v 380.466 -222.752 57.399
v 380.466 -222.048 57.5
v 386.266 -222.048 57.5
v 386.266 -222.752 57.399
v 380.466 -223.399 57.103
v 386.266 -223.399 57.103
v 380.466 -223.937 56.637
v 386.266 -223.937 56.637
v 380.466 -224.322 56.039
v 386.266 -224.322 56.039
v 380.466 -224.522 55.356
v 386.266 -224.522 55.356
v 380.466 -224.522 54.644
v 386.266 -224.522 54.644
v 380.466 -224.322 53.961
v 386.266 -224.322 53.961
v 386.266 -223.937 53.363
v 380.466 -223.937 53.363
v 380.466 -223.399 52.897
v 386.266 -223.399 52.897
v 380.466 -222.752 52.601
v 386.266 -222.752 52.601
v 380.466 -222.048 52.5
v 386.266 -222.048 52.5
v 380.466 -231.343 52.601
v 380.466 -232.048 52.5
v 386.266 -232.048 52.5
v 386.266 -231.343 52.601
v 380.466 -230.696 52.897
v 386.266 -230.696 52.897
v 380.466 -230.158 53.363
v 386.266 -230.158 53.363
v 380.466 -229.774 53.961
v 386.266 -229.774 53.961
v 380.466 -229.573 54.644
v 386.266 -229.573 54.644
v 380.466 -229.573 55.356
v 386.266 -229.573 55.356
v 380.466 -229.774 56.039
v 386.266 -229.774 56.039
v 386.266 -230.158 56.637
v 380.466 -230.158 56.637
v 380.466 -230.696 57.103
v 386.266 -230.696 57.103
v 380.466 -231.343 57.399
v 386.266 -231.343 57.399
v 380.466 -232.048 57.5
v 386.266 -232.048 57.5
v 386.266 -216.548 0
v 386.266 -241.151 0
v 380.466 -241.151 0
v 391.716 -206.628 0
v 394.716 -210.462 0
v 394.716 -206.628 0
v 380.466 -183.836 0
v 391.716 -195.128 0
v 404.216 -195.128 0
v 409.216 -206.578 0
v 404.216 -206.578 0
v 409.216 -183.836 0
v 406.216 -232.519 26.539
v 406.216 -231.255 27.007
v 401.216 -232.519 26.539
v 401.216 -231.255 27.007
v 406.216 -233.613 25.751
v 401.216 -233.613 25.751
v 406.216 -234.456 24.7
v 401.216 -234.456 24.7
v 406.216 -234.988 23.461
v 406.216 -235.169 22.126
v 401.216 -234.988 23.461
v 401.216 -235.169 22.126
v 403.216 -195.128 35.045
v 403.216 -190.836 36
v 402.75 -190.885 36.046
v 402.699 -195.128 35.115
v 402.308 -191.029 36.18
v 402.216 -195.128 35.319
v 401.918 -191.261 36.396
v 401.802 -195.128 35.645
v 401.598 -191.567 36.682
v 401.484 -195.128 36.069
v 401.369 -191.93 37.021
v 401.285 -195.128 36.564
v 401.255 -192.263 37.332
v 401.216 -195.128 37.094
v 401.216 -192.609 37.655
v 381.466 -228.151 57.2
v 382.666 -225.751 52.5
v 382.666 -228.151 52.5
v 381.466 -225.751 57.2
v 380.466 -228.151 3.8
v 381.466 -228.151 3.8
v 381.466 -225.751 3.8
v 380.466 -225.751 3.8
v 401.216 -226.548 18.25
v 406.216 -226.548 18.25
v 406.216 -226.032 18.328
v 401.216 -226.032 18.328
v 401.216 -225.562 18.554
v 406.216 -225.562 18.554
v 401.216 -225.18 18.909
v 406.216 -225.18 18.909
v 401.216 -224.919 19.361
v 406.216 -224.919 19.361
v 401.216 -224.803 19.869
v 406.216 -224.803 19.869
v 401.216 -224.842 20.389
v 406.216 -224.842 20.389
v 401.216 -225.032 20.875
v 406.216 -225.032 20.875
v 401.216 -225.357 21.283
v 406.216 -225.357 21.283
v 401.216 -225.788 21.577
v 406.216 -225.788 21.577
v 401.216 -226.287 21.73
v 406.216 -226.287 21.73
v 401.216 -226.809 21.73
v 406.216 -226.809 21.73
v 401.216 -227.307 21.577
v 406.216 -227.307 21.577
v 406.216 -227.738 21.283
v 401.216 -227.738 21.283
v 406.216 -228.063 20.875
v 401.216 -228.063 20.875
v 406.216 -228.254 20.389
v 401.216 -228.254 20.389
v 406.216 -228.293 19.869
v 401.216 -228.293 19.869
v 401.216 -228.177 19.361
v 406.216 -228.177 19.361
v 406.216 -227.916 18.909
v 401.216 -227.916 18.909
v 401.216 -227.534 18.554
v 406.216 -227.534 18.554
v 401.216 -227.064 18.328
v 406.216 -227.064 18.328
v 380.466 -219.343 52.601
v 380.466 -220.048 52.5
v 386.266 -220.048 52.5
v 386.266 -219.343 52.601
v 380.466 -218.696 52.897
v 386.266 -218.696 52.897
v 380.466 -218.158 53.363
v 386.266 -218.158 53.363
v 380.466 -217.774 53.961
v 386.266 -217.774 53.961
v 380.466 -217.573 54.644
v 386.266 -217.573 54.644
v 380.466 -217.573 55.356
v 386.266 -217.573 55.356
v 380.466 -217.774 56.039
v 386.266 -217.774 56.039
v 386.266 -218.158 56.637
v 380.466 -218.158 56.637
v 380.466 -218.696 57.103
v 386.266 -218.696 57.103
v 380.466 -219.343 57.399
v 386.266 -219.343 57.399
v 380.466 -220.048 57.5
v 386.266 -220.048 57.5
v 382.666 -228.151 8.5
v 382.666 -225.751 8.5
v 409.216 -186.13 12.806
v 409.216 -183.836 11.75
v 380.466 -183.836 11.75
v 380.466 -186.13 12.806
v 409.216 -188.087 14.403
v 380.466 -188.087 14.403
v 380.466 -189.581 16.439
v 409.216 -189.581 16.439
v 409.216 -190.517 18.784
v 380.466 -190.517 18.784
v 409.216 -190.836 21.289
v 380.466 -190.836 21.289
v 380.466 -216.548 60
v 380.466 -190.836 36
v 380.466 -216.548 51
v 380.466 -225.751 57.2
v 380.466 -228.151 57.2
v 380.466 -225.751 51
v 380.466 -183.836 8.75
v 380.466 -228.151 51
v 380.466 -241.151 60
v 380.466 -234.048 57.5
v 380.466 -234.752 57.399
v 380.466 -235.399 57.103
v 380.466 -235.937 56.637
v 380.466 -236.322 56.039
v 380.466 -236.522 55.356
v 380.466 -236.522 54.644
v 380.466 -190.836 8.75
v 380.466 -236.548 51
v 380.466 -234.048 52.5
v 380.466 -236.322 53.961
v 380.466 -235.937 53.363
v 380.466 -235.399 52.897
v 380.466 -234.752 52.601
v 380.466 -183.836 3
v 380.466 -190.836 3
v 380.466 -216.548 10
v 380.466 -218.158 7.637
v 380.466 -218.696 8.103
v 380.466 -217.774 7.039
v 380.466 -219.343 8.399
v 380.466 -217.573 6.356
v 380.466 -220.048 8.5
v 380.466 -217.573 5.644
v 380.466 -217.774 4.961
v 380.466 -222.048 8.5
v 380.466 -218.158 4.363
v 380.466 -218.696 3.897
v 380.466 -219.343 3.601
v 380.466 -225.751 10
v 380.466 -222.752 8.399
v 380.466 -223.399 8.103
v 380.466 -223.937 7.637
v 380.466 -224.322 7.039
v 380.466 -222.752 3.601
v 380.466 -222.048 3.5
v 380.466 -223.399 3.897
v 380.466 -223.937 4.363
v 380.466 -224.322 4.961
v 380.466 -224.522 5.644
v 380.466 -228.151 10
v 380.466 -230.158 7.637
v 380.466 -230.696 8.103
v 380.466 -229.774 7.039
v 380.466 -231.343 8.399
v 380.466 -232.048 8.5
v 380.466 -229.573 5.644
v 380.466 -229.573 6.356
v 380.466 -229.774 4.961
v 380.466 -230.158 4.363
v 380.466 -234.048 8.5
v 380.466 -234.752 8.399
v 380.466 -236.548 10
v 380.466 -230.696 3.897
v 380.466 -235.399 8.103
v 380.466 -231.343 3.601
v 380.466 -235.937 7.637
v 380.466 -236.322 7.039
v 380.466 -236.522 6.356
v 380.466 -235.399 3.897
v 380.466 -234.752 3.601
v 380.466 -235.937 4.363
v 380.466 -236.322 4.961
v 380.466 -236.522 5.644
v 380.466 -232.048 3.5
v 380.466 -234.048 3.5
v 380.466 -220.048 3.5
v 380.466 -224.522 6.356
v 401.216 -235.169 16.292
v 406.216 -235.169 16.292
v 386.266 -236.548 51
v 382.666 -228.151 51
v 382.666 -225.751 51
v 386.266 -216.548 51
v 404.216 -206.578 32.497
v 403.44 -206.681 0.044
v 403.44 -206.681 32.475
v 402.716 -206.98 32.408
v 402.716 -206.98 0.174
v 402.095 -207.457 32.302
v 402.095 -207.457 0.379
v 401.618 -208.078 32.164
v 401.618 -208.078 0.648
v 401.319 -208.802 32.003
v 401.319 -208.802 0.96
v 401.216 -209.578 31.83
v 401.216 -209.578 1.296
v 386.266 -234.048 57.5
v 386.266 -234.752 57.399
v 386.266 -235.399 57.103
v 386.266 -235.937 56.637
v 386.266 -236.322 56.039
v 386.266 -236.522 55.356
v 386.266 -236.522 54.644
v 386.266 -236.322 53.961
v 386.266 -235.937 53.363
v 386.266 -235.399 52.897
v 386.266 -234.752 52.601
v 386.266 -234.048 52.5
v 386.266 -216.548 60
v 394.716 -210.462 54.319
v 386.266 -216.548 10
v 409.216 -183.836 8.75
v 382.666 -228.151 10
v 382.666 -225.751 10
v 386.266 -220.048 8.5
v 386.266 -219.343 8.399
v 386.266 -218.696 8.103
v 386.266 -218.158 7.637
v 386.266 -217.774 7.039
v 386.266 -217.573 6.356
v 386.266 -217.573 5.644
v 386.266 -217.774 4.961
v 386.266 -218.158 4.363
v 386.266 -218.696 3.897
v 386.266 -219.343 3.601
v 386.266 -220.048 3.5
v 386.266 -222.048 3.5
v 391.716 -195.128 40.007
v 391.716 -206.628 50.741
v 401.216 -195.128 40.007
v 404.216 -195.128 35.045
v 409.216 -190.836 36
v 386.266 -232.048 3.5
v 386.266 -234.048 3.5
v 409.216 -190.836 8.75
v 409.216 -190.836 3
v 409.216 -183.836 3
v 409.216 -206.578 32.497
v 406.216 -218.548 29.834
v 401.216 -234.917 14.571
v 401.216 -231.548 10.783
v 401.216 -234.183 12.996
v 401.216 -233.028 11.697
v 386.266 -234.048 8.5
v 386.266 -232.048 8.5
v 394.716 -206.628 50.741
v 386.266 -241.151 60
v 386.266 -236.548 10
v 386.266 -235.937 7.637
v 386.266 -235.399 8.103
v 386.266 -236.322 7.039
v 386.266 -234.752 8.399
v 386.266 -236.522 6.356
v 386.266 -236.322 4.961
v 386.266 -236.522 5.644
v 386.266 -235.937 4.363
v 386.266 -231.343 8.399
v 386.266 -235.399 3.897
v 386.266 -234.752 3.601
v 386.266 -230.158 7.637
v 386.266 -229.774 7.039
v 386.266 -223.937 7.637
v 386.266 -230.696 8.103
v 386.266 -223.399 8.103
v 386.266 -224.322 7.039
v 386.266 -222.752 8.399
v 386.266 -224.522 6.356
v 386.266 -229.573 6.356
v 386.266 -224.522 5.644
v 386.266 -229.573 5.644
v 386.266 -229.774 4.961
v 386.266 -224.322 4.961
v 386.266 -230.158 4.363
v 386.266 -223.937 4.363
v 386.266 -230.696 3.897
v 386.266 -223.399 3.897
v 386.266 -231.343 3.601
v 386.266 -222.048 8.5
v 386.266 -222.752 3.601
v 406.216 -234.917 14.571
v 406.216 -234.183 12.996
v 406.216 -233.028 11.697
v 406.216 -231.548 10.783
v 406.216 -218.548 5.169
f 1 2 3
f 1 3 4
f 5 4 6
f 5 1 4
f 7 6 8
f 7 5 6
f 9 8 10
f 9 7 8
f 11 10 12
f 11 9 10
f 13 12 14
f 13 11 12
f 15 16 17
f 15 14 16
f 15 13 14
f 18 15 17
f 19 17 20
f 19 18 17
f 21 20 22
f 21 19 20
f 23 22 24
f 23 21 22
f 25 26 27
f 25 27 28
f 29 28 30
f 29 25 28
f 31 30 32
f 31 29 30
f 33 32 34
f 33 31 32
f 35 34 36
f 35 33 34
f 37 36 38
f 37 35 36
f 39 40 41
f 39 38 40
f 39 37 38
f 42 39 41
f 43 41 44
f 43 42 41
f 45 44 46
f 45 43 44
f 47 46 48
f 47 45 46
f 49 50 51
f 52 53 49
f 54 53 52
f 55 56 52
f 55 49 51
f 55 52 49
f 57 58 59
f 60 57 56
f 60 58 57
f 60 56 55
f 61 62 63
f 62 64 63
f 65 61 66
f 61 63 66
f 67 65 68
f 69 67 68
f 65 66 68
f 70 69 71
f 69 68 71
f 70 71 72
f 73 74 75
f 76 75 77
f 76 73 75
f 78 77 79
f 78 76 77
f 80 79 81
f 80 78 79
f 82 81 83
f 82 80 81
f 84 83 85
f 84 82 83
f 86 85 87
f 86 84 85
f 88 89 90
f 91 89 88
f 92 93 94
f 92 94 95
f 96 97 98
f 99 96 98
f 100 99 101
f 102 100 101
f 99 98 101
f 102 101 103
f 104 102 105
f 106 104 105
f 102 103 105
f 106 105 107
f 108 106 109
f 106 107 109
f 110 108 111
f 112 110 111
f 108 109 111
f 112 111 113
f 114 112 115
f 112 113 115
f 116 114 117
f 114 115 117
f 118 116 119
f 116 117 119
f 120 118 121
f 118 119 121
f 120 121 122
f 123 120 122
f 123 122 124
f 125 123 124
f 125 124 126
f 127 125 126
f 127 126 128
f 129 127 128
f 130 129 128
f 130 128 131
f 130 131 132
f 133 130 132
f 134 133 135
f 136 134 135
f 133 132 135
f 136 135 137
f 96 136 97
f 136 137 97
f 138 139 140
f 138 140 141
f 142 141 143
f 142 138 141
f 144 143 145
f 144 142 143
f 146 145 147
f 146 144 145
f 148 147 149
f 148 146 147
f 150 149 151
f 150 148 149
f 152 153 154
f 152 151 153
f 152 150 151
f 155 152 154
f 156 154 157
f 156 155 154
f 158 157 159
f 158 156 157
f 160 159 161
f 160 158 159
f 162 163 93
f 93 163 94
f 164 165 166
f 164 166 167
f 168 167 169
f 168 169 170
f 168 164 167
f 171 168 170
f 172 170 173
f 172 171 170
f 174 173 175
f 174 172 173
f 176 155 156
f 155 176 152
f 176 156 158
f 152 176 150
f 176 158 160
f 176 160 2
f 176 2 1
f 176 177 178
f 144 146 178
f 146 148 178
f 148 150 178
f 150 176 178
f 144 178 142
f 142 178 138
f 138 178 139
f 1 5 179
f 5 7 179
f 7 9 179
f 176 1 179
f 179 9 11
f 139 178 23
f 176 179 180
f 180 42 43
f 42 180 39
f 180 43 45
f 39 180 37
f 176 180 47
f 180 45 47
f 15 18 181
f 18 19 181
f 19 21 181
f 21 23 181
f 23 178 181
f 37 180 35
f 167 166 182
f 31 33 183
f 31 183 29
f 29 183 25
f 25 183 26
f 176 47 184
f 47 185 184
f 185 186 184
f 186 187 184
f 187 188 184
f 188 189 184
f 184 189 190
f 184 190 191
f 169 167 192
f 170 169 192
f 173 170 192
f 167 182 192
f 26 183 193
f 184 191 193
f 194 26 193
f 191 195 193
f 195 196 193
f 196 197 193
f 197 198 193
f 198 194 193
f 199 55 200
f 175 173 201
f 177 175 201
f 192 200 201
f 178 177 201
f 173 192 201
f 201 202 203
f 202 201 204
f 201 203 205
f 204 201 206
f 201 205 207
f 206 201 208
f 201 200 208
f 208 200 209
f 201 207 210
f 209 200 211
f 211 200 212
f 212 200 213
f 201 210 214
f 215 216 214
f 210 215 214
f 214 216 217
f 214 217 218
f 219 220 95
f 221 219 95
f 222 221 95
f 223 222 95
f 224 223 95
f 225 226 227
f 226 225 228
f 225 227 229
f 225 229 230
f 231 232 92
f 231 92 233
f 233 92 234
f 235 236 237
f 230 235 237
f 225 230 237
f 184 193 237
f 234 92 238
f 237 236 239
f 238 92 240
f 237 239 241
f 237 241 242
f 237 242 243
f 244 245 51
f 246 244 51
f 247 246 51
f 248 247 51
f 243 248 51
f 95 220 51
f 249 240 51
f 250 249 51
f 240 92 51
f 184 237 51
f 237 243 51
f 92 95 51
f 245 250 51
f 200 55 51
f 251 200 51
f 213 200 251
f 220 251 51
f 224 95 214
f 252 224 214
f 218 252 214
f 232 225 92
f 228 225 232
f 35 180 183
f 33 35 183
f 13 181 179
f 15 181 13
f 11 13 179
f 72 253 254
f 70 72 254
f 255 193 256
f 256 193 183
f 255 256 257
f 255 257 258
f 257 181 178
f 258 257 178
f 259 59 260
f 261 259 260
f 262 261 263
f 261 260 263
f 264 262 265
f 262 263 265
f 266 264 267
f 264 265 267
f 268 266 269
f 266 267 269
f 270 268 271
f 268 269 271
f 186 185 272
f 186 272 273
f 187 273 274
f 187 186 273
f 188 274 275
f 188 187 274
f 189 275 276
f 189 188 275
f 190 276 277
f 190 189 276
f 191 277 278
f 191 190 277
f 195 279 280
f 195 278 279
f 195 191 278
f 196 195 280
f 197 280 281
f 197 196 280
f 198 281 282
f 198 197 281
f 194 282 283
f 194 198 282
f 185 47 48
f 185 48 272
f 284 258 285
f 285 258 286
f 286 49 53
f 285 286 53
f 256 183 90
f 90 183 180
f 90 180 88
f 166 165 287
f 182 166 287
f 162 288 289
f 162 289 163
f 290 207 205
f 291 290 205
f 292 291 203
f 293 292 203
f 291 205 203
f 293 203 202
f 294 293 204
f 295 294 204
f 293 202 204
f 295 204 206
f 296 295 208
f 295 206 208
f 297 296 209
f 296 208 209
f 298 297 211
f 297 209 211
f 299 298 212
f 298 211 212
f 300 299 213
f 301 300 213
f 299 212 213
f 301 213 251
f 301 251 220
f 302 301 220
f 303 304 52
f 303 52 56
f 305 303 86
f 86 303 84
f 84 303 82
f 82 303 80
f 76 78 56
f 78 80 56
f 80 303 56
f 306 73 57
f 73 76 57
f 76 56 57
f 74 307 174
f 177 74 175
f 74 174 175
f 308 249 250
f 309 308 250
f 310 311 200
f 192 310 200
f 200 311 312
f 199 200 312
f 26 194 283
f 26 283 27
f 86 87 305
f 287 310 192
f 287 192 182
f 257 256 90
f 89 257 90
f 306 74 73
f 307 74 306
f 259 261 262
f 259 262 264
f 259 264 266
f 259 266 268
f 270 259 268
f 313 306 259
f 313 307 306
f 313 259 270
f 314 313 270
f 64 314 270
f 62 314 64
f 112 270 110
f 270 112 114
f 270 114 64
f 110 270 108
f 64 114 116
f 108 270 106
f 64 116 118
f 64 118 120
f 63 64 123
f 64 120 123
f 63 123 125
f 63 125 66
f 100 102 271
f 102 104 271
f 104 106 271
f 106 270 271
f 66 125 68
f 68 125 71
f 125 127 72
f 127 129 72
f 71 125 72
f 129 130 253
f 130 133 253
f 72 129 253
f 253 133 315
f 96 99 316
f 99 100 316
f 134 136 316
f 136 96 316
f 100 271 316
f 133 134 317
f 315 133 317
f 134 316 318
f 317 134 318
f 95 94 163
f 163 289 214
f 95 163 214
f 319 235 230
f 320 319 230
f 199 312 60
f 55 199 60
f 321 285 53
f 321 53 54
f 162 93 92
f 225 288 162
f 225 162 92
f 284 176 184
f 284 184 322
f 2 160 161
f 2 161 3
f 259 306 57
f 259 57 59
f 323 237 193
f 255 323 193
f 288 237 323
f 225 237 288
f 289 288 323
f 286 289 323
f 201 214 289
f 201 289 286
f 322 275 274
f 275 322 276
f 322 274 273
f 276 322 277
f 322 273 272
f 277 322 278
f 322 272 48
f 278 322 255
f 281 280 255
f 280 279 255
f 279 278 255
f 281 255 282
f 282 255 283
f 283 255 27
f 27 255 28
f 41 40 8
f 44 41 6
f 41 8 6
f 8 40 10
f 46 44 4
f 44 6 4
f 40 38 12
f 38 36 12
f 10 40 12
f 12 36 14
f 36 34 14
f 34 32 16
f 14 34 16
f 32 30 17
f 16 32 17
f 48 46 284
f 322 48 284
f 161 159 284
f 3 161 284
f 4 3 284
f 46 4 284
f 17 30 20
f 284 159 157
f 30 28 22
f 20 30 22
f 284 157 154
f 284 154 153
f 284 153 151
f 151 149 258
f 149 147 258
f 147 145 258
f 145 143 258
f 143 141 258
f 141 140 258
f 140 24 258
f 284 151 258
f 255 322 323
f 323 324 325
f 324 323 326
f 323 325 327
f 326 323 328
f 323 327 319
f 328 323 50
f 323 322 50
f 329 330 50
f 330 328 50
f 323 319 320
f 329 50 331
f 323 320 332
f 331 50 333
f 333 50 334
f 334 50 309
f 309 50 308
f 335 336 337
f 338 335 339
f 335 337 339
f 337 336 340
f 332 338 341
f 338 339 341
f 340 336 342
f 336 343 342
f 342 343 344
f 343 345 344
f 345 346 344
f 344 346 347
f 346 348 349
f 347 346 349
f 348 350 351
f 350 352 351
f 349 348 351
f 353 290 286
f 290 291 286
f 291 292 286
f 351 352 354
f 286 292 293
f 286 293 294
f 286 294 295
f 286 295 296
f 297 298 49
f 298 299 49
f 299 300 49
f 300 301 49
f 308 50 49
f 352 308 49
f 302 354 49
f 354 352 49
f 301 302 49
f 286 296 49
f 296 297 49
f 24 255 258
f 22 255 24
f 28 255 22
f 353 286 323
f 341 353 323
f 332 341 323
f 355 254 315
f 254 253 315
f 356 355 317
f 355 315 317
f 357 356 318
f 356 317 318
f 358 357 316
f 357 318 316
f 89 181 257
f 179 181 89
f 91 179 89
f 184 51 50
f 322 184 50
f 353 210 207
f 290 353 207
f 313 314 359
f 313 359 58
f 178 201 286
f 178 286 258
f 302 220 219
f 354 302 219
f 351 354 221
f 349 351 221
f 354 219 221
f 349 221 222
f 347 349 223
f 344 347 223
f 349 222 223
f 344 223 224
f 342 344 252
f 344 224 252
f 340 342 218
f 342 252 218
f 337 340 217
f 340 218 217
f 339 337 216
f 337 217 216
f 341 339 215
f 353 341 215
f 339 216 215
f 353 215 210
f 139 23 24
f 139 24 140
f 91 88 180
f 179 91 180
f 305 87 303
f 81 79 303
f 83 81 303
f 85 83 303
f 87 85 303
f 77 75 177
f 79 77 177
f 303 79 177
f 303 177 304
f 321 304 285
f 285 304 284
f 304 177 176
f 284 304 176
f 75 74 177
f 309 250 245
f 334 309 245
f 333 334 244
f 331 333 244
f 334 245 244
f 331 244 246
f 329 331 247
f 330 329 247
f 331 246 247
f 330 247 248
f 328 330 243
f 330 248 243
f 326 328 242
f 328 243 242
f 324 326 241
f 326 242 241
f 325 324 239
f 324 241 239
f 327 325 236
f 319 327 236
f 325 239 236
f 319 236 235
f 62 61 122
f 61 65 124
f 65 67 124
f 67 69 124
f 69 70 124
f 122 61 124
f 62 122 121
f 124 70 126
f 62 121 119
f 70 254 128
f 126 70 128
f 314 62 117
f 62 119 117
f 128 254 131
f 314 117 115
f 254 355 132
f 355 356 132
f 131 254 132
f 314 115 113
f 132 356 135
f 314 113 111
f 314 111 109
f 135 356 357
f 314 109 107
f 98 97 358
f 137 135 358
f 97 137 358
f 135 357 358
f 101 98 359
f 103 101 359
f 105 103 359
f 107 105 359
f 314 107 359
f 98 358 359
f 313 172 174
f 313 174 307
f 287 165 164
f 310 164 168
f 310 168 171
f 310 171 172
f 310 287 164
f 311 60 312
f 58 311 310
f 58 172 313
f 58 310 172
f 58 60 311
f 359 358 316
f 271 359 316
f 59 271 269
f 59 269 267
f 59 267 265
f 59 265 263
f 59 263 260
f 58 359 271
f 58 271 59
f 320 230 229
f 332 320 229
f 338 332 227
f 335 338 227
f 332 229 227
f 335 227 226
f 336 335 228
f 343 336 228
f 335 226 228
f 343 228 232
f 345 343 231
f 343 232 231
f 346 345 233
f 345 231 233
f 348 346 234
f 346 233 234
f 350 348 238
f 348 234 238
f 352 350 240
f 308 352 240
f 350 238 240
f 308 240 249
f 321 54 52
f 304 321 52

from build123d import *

# Parameters (mm, degrees)
BOSS_EXTRUDE1_DEPTH     = 60
CUT_EXTRUDE1_REACH      = 252.16
SKETCH4_W               = 41
SKETCH4_H               = 20
CUT_EXTRUDE2_DEPTH      = 1
CUT_EXTRUDE2_DEPTH_BACK = 1.4
CUT_EXTRUDE2_START      = -14
SKETCH2_R               = 1.75
CUT_EXTRUDE3_DEPTH      = 5
SKETCH6_W               = 3
SKETCH6_H               = 7
BOSS_EXTRUDE2_DEPTH     = 28.75
FILLET1_R               = 10
CUT_EXTRUDE4_REACH      = 252.16
CUT_EXTRUDE5_REACH      = 252.16
CUT_EXTRUDE6_REACH      = 252.16
FILLET2_R               = 5
FILLET3_R               = 6
FILLET4_R               = 2


with BuildPart() as part:
    # Sketch1 → Boss-Extrude1 (new body)
    with BuildSketch(Plane.XY):
        with BuildLine():
            Line((391.716436469, -195.128416651), (404.216436469, -195.128416651))
            Line((404.216436469, -195.128416651), (404.216436469, -206.578416651))
            ThreePointArc((404.216436469, -206.578416651), (402.095116126, -207.457096307), (401.216436469, -209.578416651))
            Line((401.216436469, -209.578416651), (401.216436469, -235.169373092))
            Line((401.216436469, -235.169373092), (406.216436469, -235.169373092))
            Line((406.216436469, -235.169373092), (406.216436469, -218.547748038))
            Line((406.216436469, -218.547748038), (409.216436469, -206.578416651))
            Line((409.216436469, -206.578416651), (409.216436469, -190.835999092))
            Line((409.216436469, -190.835999092), (380.466436469, -190.835999092))
            Line((380.466436469, -190.835999092), (380.466436469, -241.150690411))
            Line((380.466436469, -241.150690411), (386.266436469, -241.150690411))
            Line((386.266436469, -241.150690411), (386.266436469, -216.54774804))
            Line((386.266436469, -216.54774804), (394.716436469, -210.46208716))
            Line((394.716436469, -210.46208716), (394.716436469, -206.628416651))
            Line((394.716436469, -206.628416651), (391.716436469, -206.628416651))
            Line((391.716436469, -206.628416651), (391.716436469, -195.128416651))
        make_face()
    extrude(amount=BOSS_EXTRUDE1_DEPTH)

    # Cut-Extrude1: up to this face of the body (flat: up to its plane)
    cut_extrude1_end = Plane(part.part.faces().sort_by_distance((386.266436469, -228.849219226, 30))[0])
    # Sketch4 → Cut-Extrude1 (cut, up to the picked face)
    with BuildSketch(Plane.ZY.offset(-380.466436469), mode=Mode.PRIVATE) as cut_extrude1_sk1:
        with BuildLine():
            Line((57.5, -232.04774804), (57.5, -234.04774804))
            ThreePointArc((57.5, -234.04774804), (55, -236.54774804), (52.5, -234.04774804))
            Line((52.5, -234.04774804), (52.5, -232.04774804))
            ThreePointArc((52.5, -232.04774804), (55, -229.54774804), (57.5, -232.04774804))
        make_face()
    cut_extrude1_tool1 = split(extrude(cut_extrude1_sk1.sketch, amount=-CUT_EXTRUDE1_REACH, mode=Mode.PRIVATE), bisect_by=cut_extrude1_end, keep=Keep.BOTH, mode=Mode.PRIVATE)
    # Sketch4 → Cut-Extrude1 (cut, up to the picked face)
    with BuildSketch(Plane.ZY.offset(-380.466436469), mode=Mode.PRIVATE) as cut_extrude1_sk2:
        with Locations((30.5, -226.54774804)):
            Rectangle(SKETCH4_W, SKETCH4_H)
    cut_extrude1_tool2 = split(extrude(cut_extrude1_sk2.sketch, amount=-CUT_EXTRUDE1_REACH, mode=Mode.PRIVATE), bisect_by=cut_extrude1_end, keep=Keep.BOTH, mode=Mode.PRIVATE)
    # Sketch4 → Cut-Extrude1 (cut, up to the picked face)
    with BuildSketch(Plane.ZY.offset(-380.466436469), mode=Mode.PRIVATE) as cut_extrude1_sk3:
        with BuildLine():
            Line((8.5, -222.04774804), (8.5, -220.04774804))
            ThreePointArc((8.5, -220.04774804), (6, -217.54774804), (3.5, -220.04774804))
            Line((3.5, -220.04774804), (3.5, -222.04774804))
            ThreePointArc((3.5, -222.04774804), (6, -224.54774804), (8.5, -222.04774804))
        make_face()
    cut_extrude1_tool3 = split(extrude(cut_extrude1_sk3.sketch, amount=-CUT_EXTRUDE1_REACH, mode=Mode.PRIVATE), bisect_by=cut_extrude1_end, keep=Keep.BOTH, mode=Mode.PRIVATE)
    # Sketch4 → Cut-Extrude1 (cut, up to the picked face)
    with BuildSketch(Plane.ZY.offset(-380.466436469), mode=Mode.PRIVATE) as cut_extrude1_sk4:
        with BuildLine():
            Line((3.5, -232.04774804), (3.5, -234.04774804))
            ThreePointArc((3.5, -234.04774804), (6, -236.54774804), (8.5, -234.04774804))
            Line((8.5, -234.04774804), (8.5, -232.04774804))
            ThreePointArc((8.5, -232.04774804), (6, -229.54774804), (3.5, -232.04774804))
        make_face()
    cut_extrude1_tool4 = split(extrude(cut_extrude1_sk4.sketch, amount=-CUT_EXTRUDE1_REACH, mode=Mode.PRIVATE), bisect_by=cut_extrude1_end, keep=Keep.BOTH, mode=Mode.PRIVATE)
    # Sketch4 → Cut-Extrude1 (cut, up to the picked face)
    with BuildSketch(Plane.ZY.offset(-380.466436469), mode=Mode.PRIVATE) as cut_extrude1_sk5:
        with BuildLine():
            Line((57.5, -220.04774804), (57.5, -222.04774804))
            ThreePointArc((57.5, -222.04774804), (55, -224.54774804), (52.5, -222.04774804))
            Line((52.5, -222.04774804), (52.5, -220.04774804))
            ThreePointArc((52.5, -220.04774804), (55, -217.54774804), (57.5, -220.04774804))
        make_face()
    cut_extrude1_tool5 = split(extrude(cut_extrude1_sk5.sketch, amount=-CUT_EXTRUDE1_REACH, mode=Mode.PRIVATE), bisect_by=cut_extrude1_end, keep=Keep.BOTH, mode=Mode.PRIVATE)
    add(cut_extrude1_tool1.solids().sort_by(Axis((380.466436, -233.047748, 55), (1, 0, 0)))[0], mode=Mode.SUBTRACT)
    add(cut_extrude1_tool2.solids().sort_by(Axis((380.466436, -226.547748, 30.5), (1, 0, 0)))[0], mode=Mode.SUBTRACT)
    add(cut_extrude1_tool3.solids().sort_by(Axis((380.466436, -221.047748, 6), (1, 0, 0)))[0], mode=Mode.SUBTRACT)
    add(cut_extrude1_tool4.solids().sort_by(Axis((380.466436, -233.047748, 6), (1, 0, 0)))[0], mode=Mode.SUBTRACT)
    add(cut_extrude1_tool5.solids().sort_by(Axis((380.466436, -221.047748, 55), (1, 0, 0)))[0], mode=Mode.SUBTRACT)

    # Sketch5 → Cut-Extrude2 (cut, two sides: drawn at the far end of the back side and taken through both)
    with BuildSketch(Plane.XZ.offset(241.150690411).offset(CUT_EXTRUDE2_START - CUT_EXTRUDE2_DEPTH_BACK)):
        Polygon((380.466436469, 51), (382.666436469, 51), (382.666436469, 52.5), (381.466436469, 57.2), (380.466436469, 57.2), align=None)
        Polygon((380.466436469, 10), (382.666436469, 10), (382.666436469, 8.5), (381.466436469, 3.8), (380.466436469, 3.8), align=None)
    extrude(amount=CUT_EXTRUDE2_DEPTH + CUT_EXTRUDE2_DEPTH_BACK, mode=Mode.SUBTRACT)

    # Sketch2 → Cut-Extrude3 (cut)
    with BuildSketch(Plane(origin=(406.216436469, 0, 0), x_dir=(0, 0, -1), z_dir=(1, 0, 0))):
        with Locations((-20, -226.54774804)):
            Circle(SKETCH2_R)
    extrude(amount=-CUT_EXTRUDE3_DEPTH, mode=Mode.SUBTRACT)

    # Sketch6 → Boss-Extrude2 (add)
    with BuildSketch(Plane(origin=(409.216436469, 0, 0), x_dir=(0, 0, -1), z_dir=(1, 0, 0))):
        with Locations((-1.5, -187.335999092)):
            Rectangle(SKETCH6_W, SKETCH6_H)
        with Locations((-10.25, -187.335999092)):
            Rectangle(SKETCH6_W, SKETCH6_H)
    extrude(amount=-BOSS_EXTRUDE2_DEPTH)

    # Fillet1
    # the kernel refuses this fillet: 10 mm, written as the material it adds along each edge
    with BuildSketch(Plane(origin=(409.216436469, -190.835999092, 11.75), x_dir=(0, 1, 0), z_dir=(-1, 0, 0))) as fillet1_piece_1:
        with BuildLine():
            CenterArc((10, -9.539392014), FILLET1_R, 107.457603124, 72.542396876)
            Line((0, -9.539392014), (-0.2, -9.539392014))
            Line((-0.2, -9.539392014), (-0.2, 0))
            Line((-0.2, 0), (0, 0.2))
            ThreePointArc((0, 0.2), (3.5, 0.2), (6.94, 0.19078784))
            Line((6.94, 0.19078784), (7, 0))
        make_face()
    extrude(amount=28.75)

    # Cut-Extrude4: up to this face of the body (flat: up to its plane)
    cut_extrude4_end = Plane(part.part.faces().sort_by_distance((409.216436469, -198.059355839, 28.706804471))[0])
    # Sketch7 → Cut-Extrude4 (cut, up to the picked face)
    with BuildSketch(Plane.ZY.offset(-380.466436469), mode=Mode.PRIVATE) as cut_extrude4_sk1:
        Polygon((60, -190.835999092), (36, -190.835999092), (60, -216.54774804), align=None)
    cut_extrude4_tool1 = split(extrude(cut_extrude4_sk1.sketch, amount=-CUT_EXTRUDE4_REACH, mode=Mode.PRIVATE), bisect_by=cut_extrude4_end, keep=Keep.BOTH, mode=Mode.PRIVATE)
    add(cut_extrude4_tool1.solids().sort_by(Axis((380.466436, -199.406582, 52), (1, 0, 0)))[0], mode=Mode.SUBTRACT)

    # Cut-Extrude5: up to this face of the body (flat: up to its plane)
    cut_extrude5_end = Plane(part.part.faces().sort_by_distance((401.216436469, -222.505111575, 29.644283509))[0])
    # Sketch8 → Cut-Extrude5 (cut, up to the picked face)
    with BuildSketch(Plane(origin=(409.216436469, 0, 0), x_dir=(0, 0, -1), z_dir=(1, 0, 0)), mode=Mode.PRIVATE) as cut_extrude5_sk1:
        Polygon((-36, -235.169373092), (-60, -235.169373092), (-60, -190.835999092), (-36, -190.835999092), (-26.135796826, -235.169373092), align=None)
    cut_extrude5_tool1 = split(extrude(cut_extrude5_sk1.sketch, amount=-CUT_EXTRUDE5_REACH, mode=Mode.PRIVATE), bisect_by=cut_extrude5_end, keep=Keep.BOTH, mode=Mode.PRIVATE)
    add(cut_extrude5_tool1.solids().sort_by(Axis((409.216436, -214.262283, 45.393819), (-1, 0, 0)))[0], mode=Mode.SUBTRACT)

    # Cut-Extrude6: up to this face of the body (flat: up to its plane)
    cut_extrude6_end = Plane(part.part.faces().sort_by_distance((401.216436469, -221.894565092, 14.466227032))[0])
    # Sketch10 → Cut-Extrude6 (cut, up to the picked face)
    with BuildSketch(Plane(origin=(409.216436469, 0, 0), x_dir=(0, 0, -1), z_dir=(1, 0, 0)), mode=Mode.PRIVATE) as cut_extrude6_sk1:
        Polygon((0, -206.578416651), (0, -242.75353584), (-15.622362106, -242.75353584), align=None)
    cut_extrude6_tool1 = split(extrude(cut_extrude6_sk1.sketch, amount=-CUT_EXTRUDE6_REACH, mode=Mode.PRIVATE), bisect_by=cut_extrude6_end, keep=Keep.BOTH, mode=Mode.PRIVATE)
    add(cut_extrude6_tool1.solids().sort_by(Axis((409.216436, -230.695163, 5.207454), (-1, 0, 0)))[0], mode=Mode.SUBTRACT)

    # Fillet2
    fillet2_edges = [part.edges().sort_by_distance(p)[0] for p in [
        (403.716436469, -235.169373092, 26.135796826),
    ]]
    fillet(fillet2_edges, radius=FILLET2_R)

    # Fillet3
    fillet3_edges = [part.edges().sort_by_distance(p)[0] for p in [
        (403.716436469, -235.169373092, 12.347112725),
    ]]
    fillet(fillet3_edges, radius=FILLET3_R)

    # Fillet4
    fillet4_edges = [part.edges().sort_by_distance(p)[0] for p in [
        (401.216436469, -192.982207872, 35.522467217),
    ]]
    fillet(fillet4_edges, radius=FILLET4_R)


solid = part.part
